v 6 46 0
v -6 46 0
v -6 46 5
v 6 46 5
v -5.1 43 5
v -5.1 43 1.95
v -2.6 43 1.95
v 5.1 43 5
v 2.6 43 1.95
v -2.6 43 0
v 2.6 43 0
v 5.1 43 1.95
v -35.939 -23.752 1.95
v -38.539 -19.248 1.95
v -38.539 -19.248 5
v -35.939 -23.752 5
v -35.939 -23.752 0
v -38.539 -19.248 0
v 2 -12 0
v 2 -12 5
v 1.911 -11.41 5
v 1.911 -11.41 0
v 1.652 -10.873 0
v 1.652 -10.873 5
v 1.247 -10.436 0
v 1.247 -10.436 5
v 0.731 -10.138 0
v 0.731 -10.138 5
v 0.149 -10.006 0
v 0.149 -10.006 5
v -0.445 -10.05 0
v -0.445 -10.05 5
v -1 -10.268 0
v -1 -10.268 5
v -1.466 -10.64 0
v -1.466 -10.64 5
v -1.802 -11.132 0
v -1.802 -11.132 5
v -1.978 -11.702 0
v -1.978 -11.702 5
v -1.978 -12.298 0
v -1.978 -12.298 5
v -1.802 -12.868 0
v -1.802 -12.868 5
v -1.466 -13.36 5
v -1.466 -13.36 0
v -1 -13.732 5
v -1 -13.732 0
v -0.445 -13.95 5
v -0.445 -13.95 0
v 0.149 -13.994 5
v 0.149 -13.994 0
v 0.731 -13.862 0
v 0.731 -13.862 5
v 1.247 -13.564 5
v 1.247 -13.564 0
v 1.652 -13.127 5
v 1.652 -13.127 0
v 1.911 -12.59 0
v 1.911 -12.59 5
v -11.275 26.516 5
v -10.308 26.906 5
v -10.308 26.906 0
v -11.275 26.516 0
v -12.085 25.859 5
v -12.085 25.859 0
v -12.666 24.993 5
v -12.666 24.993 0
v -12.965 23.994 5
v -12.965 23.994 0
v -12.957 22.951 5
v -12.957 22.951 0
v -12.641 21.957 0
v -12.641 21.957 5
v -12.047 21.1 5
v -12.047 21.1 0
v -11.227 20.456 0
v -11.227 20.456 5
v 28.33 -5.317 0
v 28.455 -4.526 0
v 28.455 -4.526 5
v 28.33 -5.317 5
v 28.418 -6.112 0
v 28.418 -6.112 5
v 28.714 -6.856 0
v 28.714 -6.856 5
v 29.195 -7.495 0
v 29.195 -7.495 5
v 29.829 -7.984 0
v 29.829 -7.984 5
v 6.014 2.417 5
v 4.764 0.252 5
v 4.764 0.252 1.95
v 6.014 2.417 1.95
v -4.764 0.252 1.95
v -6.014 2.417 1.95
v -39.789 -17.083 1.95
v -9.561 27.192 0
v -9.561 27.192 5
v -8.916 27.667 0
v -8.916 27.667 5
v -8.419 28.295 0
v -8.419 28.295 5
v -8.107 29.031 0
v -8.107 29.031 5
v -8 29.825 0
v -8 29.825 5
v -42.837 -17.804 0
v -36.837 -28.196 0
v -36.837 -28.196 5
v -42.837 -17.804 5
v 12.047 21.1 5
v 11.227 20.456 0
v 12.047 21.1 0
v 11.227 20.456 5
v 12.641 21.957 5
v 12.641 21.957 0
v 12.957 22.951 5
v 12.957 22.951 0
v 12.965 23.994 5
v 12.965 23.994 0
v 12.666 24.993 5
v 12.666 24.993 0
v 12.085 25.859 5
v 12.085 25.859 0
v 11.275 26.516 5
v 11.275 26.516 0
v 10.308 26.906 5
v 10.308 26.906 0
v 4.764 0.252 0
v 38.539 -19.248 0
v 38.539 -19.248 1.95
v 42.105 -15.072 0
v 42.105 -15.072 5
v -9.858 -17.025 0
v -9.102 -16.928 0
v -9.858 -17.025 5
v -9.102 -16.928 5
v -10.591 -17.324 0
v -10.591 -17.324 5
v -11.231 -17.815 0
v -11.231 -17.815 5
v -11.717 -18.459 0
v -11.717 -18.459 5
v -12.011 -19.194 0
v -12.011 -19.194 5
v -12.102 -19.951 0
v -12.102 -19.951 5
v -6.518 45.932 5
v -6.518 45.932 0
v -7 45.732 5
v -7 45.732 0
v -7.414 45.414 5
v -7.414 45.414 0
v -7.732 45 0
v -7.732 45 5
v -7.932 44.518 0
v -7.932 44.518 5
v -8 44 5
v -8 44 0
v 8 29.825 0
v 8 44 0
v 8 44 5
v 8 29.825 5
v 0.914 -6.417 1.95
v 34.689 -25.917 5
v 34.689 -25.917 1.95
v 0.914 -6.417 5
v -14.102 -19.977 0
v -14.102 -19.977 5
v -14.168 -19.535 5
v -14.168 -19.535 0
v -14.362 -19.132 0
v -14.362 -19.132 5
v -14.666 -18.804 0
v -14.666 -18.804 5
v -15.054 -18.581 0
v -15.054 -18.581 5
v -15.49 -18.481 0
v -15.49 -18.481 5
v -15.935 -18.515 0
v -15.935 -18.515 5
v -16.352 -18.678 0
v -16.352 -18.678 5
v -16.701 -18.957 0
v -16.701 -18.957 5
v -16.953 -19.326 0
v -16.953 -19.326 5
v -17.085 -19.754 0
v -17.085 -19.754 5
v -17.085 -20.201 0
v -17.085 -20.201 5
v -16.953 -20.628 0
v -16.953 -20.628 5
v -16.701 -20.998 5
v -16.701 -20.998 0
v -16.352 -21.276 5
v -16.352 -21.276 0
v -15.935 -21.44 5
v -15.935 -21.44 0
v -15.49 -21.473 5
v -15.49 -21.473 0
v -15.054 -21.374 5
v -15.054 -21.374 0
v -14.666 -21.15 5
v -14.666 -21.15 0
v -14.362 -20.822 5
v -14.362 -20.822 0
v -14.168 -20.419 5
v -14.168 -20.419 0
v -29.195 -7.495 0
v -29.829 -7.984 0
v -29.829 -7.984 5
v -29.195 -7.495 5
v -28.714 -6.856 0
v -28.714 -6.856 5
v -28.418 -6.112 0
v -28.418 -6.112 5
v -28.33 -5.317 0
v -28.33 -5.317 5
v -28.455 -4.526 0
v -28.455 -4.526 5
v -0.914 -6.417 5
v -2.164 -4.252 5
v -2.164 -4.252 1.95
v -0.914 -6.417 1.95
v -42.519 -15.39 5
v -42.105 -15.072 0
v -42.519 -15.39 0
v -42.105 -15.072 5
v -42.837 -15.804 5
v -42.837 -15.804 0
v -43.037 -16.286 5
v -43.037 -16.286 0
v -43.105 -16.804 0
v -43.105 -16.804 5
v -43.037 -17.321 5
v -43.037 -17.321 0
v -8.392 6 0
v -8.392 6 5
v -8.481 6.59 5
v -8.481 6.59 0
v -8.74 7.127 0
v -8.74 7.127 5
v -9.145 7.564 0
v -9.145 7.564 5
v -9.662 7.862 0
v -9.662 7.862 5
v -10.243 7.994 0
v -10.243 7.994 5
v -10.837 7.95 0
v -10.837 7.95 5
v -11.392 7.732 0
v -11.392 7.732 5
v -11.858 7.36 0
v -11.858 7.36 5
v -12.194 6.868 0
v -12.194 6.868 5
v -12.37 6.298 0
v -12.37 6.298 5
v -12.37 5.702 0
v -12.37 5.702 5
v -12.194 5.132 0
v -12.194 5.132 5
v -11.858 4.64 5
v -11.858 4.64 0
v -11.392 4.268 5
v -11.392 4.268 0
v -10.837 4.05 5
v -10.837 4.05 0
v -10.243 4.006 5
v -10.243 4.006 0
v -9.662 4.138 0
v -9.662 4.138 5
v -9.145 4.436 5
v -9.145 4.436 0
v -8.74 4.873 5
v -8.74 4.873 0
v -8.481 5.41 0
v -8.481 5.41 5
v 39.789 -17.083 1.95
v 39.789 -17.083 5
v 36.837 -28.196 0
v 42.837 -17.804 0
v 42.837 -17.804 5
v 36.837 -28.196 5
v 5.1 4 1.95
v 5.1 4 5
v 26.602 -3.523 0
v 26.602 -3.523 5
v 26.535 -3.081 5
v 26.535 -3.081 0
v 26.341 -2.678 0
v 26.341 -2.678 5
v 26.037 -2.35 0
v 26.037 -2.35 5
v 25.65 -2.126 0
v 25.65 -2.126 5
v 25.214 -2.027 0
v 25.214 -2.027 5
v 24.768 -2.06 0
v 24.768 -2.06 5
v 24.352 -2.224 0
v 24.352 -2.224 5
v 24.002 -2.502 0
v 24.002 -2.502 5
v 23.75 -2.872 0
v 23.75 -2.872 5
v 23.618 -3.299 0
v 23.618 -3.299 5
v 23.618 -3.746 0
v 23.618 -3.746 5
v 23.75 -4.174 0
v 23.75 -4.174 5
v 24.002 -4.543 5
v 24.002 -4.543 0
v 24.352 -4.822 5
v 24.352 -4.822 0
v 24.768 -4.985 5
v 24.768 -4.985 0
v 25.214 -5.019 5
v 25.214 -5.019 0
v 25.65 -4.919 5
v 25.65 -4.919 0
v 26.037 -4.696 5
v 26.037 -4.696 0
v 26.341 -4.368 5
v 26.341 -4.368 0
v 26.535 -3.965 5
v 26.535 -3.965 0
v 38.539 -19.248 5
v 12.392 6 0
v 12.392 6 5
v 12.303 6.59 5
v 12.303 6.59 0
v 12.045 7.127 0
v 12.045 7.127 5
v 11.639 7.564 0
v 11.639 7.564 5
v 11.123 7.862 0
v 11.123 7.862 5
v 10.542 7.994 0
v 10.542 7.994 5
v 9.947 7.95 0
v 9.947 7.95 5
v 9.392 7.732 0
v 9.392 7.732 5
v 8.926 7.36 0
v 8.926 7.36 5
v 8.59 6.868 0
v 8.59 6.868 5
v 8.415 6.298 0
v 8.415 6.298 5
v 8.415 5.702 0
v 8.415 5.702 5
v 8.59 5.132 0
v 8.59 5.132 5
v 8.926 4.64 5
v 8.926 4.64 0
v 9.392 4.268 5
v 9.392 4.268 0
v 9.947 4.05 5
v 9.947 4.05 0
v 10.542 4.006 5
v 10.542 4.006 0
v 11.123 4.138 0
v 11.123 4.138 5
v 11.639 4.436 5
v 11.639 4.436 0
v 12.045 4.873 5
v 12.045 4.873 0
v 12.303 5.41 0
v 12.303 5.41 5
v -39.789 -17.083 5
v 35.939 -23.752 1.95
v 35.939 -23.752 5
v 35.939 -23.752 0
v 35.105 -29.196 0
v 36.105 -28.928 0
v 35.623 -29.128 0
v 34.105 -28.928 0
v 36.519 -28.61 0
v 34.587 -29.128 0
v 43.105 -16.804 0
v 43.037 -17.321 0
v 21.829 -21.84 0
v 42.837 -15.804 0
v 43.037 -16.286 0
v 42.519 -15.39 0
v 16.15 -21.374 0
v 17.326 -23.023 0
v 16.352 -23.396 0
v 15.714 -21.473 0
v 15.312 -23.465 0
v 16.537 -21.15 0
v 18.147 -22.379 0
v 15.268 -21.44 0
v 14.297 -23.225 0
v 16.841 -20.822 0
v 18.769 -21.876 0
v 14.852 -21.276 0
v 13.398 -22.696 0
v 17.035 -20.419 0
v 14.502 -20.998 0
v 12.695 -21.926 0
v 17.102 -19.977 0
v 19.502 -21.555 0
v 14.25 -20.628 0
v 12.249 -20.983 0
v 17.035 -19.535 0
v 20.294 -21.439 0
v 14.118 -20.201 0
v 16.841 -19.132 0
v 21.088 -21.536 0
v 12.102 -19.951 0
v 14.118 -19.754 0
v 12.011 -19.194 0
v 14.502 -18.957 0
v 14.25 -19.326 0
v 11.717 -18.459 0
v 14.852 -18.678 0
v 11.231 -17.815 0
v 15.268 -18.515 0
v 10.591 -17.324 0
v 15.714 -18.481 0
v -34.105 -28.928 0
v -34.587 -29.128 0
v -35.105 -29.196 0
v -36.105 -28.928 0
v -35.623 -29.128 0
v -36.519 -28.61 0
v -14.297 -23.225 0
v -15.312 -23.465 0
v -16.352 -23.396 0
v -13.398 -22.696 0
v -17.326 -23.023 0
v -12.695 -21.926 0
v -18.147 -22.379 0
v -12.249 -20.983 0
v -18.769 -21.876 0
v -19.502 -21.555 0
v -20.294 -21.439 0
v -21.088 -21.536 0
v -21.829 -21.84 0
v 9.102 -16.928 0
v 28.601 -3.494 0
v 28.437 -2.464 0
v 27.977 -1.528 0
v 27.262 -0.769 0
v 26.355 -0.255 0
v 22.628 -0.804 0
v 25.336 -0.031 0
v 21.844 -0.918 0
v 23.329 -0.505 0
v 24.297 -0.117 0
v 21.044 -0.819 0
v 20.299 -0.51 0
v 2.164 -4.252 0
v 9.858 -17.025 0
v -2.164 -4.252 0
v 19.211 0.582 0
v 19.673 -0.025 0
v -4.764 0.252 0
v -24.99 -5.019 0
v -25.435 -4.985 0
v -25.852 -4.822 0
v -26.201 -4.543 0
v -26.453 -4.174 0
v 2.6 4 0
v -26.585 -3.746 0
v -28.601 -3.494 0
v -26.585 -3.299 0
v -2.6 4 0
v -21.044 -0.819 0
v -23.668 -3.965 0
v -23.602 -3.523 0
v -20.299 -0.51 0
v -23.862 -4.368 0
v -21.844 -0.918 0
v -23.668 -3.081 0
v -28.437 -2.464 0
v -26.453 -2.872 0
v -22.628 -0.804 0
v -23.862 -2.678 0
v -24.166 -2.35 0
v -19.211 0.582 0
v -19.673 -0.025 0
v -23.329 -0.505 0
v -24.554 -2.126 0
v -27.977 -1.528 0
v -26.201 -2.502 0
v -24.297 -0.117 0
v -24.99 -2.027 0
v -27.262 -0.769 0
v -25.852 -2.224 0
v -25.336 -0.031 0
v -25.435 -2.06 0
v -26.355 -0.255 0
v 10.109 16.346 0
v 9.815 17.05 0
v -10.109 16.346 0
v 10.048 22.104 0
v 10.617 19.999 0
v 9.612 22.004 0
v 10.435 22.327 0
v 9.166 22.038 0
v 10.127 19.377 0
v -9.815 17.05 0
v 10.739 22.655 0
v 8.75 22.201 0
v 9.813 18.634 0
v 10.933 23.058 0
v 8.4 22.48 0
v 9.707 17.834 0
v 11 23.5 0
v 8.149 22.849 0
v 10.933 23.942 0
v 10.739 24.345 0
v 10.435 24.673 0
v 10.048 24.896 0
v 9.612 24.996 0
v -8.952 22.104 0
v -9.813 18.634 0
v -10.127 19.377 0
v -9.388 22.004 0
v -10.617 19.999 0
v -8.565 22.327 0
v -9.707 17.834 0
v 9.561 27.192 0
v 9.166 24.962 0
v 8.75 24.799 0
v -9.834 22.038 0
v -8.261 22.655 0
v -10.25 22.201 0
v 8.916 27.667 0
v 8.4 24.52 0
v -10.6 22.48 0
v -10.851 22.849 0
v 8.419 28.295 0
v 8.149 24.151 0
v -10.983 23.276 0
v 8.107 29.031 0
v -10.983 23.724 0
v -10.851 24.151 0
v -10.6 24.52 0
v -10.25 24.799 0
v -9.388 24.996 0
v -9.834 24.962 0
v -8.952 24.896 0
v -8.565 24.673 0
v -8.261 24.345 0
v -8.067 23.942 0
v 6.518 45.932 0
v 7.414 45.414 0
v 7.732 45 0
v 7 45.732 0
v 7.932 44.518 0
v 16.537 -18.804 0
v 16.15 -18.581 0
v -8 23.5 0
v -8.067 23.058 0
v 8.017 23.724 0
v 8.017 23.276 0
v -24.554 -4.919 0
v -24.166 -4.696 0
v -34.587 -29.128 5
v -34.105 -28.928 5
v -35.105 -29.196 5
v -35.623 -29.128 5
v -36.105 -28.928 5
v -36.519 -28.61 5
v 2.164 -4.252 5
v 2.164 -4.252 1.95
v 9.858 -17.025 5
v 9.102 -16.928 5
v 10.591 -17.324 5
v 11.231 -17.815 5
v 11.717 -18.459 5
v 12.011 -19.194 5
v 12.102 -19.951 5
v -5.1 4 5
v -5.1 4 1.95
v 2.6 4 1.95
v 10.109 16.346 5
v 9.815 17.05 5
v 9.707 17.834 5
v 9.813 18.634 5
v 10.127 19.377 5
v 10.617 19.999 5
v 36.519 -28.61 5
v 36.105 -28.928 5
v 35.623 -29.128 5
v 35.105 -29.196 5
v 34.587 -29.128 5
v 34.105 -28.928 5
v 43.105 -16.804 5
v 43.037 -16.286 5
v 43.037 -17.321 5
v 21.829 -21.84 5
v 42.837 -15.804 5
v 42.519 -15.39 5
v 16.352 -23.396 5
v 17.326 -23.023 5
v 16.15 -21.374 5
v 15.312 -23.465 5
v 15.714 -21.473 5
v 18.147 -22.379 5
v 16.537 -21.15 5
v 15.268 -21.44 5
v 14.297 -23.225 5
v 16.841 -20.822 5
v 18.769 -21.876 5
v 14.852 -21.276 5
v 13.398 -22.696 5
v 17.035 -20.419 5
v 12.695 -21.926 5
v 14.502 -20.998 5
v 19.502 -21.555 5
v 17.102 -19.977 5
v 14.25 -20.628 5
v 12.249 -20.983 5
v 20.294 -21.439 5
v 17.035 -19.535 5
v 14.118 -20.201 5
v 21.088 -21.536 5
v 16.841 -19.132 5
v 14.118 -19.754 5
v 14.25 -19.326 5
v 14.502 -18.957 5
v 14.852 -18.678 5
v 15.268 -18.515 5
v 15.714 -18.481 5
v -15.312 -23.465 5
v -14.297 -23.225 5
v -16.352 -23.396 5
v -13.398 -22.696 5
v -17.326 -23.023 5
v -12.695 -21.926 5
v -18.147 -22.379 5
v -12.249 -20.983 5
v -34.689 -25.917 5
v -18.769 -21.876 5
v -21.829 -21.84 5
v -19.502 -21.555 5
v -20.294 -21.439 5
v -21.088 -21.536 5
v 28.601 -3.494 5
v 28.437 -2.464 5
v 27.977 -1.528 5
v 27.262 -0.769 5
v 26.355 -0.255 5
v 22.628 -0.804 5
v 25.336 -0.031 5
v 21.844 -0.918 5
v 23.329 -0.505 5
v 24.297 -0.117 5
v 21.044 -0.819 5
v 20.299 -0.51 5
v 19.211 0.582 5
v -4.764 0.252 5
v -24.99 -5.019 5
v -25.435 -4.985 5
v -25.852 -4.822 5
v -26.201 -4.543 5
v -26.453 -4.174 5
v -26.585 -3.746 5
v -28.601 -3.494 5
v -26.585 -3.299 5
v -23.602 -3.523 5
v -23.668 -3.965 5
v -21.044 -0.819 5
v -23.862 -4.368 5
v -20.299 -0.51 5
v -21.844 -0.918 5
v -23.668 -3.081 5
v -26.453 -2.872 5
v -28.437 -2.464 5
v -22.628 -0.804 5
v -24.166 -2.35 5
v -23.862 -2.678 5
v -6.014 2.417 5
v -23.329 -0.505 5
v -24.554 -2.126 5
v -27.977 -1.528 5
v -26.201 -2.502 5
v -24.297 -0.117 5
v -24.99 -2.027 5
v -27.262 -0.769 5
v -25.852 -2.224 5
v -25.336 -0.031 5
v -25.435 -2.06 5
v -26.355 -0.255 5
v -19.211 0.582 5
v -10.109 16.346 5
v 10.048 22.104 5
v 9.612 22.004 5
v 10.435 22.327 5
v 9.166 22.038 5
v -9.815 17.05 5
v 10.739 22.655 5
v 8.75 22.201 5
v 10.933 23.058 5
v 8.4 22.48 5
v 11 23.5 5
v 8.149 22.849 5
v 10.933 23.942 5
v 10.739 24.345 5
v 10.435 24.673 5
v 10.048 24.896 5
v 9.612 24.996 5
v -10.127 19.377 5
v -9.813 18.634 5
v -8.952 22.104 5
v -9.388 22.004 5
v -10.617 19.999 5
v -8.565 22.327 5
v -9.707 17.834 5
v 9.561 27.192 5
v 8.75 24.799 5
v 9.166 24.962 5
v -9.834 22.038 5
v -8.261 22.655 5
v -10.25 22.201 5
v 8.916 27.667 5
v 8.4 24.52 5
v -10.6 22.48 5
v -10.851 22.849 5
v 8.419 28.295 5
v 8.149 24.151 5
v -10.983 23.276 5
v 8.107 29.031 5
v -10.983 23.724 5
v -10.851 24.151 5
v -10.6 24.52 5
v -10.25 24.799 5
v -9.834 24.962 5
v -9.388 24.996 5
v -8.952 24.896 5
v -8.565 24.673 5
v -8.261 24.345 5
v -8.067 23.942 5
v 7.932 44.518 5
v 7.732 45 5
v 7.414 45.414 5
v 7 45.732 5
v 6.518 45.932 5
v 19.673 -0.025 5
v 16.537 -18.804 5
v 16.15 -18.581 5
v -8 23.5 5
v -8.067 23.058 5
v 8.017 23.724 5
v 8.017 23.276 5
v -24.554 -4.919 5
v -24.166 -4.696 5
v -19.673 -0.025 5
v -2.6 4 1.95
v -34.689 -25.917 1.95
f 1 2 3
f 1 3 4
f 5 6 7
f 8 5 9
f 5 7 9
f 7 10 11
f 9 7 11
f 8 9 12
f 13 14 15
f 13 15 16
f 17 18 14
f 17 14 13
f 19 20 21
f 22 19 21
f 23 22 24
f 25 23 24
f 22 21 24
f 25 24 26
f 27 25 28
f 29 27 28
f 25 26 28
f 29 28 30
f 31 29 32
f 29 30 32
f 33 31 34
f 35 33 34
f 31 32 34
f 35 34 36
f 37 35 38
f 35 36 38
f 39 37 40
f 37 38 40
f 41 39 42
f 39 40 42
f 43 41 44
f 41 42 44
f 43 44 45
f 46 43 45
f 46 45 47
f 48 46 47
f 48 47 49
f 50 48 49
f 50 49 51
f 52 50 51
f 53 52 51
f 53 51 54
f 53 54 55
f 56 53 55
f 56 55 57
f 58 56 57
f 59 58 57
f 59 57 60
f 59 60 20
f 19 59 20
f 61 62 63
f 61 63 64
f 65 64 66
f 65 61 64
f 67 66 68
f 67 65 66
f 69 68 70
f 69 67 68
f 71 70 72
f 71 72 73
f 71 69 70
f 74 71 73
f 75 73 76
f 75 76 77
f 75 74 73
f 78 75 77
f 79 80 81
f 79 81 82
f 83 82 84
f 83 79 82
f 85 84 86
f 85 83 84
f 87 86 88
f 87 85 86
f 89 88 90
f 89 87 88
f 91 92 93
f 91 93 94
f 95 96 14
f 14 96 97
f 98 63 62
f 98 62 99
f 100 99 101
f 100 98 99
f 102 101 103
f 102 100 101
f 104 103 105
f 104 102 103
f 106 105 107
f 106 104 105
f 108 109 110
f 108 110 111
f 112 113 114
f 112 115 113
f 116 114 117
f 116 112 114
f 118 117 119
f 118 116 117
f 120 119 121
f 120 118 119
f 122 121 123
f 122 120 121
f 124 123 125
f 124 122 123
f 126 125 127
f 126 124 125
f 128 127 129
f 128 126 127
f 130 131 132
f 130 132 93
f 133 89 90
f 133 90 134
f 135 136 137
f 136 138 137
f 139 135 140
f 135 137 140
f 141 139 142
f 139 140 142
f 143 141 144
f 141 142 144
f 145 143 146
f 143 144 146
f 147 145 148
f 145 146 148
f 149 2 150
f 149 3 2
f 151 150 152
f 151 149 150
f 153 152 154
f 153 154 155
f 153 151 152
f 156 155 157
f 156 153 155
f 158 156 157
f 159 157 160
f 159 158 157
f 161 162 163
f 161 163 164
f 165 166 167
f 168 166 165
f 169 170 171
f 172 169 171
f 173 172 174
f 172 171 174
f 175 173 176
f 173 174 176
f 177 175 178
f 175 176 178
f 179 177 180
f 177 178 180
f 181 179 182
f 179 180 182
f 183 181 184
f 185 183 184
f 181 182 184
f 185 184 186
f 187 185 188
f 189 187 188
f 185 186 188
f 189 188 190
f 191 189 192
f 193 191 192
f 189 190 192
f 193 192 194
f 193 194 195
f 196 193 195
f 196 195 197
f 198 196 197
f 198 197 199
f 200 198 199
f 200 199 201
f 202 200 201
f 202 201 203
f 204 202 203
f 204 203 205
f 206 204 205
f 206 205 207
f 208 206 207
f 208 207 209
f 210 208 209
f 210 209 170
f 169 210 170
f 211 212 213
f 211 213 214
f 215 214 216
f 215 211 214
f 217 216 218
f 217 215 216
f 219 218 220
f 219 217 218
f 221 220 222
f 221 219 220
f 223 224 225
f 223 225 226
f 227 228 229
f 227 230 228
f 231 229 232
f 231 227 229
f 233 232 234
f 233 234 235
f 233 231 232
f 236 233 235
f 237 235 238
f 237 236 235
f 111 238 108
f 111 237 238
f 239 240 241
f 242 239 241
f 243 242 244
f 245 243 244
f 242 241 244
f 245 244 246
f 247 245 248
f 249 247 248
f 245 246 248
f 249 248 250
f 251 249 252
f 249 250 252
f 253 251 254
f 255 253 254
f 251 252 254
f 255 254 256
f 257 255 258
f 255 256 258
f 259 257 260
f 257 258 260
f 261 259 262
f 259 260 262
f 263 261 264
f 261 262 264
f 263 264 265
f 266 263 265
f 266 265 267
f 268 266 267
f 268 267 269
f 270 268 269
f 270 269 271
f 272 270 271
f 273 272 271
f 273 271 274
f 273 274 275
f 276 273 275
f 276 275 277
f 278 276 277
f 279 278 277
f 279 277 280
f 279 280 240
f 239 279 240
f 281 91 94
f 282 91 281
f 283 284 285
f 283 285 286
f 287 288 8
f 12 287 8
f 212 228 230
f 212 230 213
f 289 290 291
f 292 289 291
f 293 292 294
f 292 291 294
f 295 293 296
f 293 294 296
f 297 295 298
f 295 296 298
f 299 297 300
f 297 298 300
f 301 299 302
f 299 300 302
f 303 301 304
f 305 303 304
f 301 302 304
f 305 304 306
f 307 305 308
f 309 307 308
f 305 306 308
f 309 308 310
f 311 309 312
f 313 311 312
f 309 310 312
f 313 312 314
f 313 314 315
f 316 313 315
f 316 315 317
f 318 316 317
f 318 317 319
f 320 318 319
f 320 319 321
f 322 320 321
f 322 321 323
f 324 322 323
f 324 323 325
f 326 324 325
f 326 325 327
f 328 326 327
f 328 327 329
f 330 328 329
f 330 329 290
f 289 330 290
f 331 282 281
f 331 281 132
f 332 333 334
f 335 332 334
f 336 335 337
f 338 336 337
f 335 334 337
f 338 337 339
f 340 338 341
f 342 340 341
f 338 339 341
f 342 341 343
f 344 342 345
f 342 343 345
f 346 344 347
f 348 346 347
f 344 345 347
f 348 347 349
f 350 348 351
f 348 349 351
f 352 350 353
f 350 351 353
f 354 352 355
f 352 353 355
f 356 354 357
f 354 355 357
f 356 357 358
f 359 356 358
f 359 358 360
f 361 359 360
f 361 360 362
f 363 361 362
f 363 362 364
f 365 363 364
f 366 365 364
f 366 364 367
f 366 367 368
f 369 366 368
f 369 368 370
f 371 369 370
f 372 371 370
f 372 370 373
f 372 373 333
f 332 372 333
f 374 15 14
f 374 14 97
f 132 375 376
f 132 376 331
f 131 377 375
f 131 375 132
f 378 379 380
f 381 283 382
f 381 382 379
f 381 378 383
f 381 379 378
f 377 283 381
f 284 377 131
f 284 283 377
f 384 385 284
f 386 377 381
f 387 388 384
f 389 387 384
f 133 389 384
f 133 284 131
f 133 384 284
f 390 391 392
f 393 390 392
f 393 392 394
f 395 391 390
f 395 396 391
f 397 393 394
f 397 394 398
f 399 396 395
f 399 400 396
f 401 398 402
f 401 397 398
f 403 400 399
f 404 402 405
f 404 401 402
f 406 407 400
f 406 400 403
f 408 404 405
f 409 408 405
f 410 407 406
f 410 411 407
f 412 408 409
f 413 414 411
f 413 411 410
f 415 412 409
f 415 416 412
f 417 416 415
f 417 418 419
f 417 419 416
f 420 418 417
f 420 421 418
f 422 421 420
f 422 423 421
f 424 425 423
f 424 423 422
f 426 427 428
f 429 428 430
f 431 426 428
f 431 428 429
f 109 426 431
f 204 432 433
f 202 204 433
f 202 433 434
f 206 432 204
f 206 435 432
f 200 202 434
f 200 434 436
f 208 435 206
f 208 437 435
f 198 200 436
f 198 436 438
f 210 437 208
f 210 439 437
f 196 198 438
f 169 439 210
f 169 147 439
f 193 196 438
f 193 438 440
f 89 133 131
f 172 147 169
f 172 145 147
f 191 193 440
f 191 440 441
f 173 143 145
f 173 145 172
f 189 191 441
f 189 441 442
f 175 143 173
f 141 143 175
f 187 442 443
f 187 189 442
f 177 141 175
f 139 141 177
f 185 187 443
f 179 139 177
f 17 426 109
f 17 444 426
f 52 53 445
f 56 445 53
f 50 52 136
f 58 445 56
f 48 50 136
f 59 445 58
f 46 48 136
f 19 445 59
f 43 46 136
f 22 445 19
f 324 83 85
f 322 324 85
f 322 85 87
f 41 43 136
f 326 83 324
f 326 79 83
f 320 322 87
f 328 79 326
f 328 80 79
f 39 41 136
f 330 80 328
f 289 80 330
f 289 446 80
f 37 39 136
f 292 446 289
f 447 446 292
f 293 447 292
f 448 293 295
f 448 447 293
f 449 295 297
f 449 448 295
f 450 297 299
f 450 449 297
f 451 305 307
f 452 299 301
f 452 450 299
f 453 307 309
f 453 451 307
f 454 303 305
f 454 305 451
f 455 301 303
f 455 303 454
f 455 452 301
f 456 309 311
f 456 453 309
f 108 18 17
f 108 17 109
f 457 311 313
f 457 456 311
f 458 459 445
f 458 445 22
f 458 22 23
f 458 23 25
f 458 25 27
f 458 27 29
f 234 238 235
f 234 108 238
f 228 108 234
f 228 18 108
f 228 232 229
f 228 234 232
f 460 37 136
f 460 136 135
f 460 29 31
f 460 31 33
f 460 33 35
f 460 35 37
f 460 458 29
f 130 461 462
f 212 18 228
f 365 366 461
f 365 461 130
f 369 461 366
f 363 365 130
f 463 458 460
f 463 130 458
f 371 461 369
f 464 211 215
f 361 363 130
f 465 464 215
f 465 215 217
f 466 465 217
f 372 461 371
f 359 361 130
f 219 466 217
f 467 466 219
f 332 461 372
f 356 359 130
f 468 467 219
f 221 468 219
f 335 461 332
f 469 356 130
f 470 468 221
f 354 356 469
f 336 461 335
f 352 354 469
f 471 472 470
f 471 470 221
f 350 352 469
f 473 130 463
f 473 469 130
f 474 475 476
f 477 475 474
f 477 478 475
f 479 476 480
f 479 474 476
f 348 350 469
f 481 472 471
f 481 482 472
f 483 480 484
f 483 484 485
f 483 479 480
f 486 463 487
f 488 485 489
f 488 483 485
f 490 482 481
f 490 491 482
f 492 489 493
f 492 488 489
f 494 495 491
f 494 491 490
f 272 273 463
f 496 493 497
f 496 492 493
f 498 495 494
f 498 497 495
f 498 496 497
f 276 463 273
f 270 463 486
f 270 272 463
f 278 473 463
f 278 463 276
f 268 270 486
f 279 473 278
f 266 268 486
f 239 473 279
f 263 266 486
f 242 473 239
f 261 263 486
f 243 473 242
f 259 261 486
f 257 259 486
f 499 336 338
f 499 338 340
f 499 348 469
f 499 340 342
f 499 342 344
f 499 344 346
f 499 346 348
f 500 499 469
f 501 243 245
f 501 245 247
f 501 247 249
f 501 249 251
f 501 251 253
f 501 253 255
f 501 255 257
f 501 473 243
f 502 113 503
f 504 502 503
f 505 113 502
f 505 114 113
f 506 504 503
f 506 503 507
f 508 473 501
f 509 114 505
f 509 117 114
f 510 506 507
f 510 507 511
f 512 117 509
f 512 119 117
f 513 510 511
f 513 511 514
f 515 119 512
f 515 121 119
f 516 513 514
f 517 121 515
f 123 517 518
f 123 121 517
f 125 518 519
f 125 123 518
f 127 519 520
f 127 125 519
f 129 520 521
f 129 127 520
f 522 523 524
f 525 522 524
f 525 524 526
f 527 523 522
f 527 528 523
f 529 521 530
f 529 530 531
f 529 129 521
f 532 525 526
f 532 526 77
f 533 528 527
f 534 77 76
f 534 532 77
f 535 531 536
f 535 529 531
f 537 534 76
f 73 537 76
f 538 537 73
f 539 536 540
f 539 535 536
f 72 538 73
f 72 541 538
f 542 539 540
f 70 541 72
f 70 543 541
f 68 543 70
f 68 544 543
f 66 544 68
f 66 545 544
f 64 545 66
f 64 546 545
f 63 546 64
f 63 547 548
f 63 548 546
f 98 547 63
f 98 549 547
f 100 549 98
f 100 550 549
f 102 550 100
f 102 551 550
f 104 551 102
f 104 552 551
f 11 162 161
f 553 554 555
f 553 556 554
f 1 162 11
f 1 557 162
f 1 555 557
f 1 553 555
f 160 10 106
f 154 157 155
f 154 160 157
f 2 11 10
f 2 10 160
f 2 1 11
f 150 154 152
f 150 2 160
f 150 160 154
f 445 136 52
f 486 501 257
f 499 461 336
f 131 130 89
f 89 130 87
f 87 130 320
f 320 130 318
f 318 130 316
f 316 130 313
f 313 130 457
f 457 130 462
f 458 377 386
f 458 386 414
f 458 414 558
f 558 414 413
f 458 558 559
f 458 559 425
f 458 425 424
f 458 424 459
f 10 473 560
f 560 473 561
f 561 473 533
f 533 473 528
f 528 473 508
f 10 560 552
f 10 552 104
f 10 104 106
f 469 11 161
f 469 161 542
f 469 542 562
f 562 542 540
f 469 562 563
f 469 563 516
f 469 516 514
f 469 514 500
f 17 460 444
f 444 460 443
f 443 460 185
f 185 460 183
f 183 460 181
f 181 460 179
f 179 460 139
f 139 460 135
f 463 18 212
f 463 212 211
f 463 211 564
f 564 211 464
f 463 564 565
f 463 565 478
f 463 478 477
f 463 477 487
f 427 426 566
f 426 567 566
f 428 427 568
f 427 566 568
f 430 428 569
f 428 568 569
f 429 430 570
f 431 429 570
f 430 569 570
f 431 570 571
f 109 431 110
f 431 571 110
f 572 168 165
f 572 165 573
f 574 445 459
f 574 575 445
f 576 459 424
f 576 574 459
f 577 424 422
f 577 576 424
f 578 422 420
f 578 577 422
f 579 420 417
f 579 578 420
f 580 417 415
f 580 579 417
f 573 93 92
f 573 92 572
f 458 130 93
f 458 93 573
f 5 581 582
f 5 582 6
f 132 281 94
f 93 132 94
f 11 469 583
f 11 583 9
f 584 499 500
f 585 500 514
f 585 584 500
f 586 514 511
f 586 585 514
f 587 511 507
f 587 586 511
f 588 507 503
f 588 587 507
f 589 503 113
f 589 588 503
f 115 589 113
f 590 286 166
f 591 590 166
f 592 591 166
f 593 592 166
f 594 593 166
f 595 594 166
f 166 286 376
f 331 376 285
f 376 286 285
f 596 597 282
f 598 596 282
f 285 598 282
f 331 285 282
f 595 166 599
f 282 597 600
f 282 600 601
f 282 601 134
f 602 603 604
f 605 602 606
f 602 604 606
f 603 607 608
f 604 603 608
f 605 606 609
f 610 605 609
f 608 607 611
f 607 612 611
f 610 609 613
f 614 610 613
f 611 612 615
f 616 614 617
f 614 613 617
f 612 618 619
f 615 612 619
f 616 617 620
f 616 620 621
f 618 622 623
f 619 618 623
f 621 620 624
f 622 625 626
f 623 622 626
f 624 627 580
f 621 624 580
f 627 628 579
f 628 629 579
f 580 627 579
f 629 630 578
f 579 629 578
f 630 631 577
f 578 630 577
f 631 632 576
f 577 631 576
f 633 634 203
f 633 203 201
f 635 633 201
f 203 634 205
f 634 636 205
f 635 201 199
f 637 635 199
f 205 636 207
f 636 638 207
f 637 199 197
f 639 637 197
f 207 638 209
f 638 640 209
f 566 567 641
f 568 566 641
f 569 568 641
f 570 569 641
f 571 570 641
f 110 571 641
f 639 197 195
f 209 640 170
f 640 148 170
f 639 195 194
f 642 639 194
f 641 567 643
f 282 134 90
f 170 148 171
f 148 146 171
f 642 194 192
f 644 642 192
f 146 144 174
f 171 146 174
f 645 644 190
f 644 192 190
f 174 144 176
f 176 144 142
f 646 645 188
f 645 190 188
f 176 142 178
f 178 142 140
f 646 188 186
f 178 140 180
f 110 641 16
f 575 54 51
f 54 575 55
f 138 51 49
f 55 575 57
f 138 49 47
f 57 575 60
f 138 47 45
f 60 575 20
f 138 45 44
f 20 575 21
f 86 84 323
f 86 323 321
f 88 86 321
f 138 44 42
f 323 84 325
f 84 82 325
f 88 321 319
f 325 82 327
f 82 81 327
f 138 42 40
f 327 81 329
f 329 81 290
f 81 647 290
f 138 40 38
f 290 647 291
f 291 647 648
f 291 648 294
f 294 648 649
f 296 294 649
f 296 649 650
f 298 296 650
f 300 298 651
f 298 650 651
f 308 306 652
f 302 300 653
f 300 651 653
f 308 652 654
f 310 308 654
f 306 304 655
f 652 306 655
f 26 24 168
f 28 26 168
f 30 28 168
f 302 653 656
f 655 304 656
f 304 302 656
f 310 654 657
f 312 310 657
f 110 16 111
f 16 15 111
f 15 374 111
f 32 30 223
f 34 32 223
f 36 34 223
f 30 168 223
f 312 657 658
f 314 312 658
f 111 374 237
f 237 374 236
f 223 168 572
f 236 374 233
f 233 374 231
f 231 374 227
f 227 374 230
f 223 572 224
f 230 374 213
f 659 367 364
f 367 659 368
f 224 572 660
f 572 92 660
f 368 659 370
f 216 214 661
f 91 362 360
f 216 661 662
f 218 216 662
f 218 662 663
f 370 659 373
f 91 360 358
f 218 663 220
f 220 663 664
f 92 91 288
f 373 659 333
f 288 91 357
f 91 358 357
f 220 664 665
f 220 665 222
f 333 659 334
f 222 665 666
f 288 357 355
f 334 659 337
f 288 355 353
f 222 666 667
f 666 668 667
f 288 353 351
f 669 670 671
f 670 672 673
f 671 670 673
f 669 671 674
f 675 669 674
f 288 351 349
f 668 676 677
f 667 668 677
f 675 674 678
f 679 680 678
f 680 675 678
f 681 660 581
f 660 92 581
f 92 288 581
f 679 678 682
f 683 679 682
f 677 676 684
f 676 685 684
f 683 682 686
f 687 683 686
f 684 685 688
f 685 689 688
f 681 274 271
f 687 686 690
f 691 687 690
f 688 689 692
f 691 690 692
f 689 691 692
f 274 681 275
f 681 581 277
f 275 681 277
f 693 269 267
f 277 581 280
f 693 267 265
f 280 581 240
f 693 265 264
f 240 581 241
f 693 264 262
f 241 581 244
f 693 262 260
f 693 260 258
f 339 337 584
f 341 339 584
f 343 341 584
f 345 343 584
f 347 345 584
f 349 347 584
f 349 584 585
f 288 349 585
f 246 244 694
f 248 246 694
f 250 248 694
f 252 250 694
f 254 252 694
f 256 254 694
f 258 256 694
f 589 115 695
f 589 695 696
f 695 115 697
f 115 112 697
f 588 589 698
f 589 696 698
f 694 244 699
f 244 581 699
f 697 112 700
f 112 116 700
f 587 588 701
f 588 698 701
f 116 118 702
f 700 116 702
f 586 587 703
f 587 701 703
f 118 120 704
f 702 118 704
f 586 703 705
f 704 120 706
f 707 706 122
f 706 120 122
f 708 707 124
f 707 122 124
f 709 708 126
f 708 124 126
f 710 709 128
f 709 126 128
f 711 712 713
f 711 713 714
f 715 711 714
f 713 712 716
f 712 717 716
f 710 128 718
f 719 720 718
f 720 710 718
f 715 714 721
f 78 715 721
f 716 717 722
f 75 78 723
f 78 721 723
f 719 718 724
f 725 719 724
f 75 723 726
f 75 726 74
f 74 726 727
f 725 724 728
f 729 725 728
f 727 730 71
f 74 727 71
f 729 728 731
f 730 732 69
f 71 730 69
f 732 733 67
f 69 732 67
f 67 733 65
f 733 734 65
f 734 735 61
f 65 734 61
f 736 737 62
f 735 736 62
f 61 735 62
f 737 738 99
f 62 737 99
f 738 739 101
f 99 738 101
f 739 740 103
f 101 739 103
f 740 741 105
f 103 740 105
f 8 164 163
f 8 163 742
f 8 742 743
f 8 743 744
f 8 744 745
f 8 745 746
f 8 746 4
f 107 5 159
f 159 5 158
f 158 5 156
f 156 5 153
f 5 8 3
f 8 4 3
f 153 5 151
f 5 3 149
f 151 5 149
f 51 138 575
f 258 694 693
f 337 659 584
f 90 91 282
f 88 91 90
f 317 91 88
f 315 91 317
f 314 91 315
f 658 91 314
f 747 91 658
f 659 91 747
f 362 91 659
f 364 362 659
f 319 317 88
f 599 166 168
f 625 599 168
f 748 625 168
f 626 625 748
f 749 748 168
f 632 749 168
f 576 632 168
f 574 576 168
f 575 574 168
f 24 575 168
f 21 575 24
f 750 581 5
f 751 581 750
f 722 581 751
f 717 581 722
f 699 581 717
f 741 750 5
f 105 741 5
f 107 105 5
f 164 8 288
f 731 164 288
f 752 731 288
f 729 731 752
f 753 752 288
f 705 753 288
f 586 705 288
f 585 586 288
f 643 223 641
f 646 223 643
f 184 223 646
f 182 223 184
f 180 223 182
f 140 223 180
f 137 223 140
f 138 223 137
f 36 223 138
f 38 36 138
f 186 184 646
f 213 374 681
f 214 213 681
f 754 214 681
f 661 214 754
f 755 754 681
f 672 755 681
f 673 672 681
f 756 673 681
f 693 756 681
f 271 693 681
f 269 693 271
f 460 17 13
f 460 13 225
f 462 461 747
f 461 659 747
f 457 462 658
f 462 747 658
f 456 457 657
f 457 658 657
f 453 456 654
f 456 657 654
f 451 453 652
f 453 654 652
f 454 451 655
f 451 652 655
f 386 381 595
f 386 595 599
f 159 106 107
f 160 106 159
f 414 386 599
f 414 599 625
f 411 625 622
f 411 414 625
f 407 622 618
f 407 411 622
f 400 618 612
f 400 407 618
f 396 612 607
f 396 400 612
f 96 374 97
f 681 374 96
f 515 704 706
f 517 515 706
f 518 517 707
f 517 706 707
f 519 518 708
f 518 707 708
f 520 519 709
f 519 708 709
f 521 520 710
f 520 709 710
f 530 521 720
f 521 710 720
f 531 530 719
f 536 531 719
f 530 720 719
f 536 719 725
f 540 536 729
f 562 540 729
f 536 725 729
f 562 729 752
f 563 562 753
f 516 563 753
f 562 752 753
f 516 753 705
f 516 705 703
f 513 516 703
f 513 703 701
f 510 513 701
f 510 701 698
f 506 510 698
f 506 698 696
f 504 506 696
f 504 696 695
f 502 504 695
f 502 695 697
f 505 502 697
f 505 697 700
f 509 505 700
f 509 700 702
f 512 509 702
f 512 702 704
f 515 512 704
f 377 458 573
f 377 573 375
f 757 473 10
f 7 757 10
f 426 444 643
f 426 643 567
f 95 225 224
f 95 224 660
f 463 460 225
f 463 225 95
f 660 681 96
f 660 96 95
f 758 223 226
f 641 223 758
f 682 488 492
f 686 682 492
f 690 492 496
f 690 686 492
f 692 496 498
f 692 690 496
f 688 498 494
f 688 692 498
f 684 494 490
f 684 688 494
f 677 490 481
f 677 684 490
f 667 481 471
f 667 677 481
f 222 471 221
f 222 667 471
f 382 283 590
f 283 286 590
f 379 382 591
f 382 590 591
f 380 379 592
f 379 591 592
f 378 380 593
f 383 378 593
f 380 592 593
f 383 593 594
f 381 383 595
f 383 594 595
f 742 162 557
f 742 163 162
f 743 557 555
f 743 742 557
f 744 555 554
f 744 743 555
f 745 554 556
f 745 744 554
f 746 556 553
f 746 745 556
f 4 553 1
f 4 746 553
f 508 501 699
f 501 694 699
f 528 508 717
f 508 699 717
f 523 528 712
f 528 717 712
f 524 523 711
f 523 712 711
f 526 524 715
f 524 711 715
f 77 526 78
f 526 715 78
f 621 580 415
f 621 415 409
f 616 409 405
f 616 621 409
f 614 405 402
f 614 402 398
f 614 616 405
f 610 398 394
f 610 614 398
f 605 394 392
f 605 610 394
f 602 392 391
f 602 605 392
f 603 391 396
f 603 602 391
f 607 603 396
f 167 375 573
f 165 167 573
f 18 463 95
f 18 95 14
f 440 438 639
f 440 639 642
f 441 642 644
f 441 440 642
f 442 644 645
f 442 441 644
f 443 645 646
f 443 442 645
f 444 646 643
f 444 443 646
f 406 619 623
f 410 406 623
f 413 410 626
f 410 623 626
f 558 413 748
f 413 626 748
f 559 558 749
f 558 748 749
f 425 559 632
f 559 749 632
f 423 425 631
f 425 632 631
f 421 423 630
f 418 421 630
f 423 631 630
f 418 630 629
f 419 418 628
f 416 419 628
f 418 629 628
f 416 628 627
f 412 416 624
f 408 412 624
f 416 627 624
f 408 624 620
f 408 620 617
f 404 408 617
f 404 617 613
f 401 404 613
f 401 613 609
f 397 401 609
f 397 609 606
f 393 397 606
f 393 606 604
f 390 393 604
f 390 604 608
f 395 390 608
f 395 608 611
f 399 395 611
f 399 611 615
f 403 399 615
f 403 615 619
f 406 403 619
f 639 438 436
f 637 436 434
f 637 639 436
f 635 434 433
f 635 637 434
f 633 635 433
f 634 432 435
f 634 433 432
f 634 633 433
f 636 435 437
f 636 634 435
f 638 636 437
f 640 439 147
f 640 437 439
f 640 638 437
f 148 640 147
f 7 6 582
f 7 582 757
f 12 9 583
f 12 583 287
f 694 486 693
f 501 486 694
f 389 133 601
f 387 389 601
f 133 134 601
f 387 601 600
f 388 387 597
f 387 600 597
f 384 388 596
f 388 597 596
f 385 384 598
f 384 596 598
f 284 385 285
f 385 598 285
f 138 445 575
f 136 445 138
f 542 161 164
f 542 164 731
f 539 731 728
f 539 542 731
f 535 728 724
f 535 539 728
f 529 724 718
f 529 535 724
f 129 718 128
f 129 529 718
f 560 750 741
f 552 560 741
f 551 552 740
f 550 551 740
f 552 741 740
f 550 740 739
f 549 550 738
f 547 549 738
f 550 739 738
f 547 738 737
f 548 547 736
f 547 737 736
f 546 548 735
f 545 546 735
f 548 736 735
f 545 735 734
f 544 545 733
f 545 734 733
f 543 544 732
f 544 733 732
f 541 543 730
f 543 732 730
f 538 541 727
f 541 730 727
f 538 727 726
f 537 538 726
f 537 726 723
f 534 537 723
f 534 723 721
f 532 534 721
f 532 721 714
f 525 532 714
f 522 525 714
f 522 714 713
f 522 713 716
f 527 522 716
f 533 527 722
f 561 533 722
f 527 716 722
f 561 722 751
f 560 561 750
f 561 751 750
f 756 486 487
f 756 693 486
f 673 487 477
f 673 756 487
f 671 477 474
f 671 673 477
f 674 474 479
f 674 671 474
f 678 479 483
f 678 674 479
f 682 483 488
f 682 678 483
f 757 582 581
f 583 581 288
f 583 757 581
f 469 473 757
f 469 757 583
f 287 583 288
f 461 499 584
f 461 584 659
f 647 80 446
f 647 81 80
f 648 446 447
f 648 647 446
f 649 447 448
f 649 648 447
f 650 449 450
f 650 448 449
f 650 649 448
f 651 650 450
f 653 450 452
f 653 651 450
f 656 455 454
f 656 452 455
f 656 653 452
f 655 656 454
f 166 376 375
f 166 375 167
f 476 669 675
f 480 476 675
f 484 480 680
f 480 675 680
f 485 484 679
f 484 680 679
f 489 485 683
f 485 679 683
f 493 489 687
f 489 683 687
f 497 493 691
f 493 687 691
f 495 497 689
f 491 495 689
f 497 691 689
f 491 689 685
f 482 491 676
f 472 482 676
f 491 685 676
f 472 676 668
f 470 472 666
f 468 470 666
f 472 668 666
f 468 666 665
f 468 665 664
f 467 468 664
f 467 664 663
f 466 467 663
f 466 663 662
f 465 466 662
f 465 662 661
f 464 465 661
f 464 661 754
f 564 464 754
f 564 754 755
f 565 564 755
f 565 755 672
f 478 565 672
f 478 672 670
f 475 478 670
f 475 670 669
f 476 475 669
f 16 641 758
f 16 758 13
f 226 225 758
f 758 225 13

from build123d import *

# Parameters (mm, degrees)
SKETCH1_W           = 5.2
SKETCH1_H           = 39
BOSS_EXTRUDE1_DEPTH = 5
SKETCH2_W           = 10.2
SKETCH2_H           = 39
CUT_EXTRUDE1_DEPTH  = 3.05
CUT_EXTRUDE2_REACH  = 65.739
SKETCH3_R           = 2
SKETCH4_R           = 3.5
SKETCH4_R_2         = 1.5
BOSS_EXTRUDE2_DEPTH = 5
FILLET1_R           = 3
FILLET2_R           = 3
FILLET3_R           = 2


with BuildPart() as part:
    # Sketch1 → Boss-Extrude1 (new body)
    with BuildSketch(Plane.XY):
        Polygon((-8, 46), (8, 46), (8, 20), (21.320508076, -3.07179677), (43.837168574, -16.07179677), (35.837168574, -29.92820323), (13.320508076, -16.92820323), (-13.320508076, -16.92820323), (-35.837168574, -29.92820323), (-43.837168574, -16.07179677), (-21.320508076, -3.07179677), (-8, 20), align=None)
        Polygon((4.764101615, 0.25166605), (2.164101615, -4.25166605), (35.939092363, -23.75166605), (38.539092363, -19.24833395), align=None, mode=Mode.SUBTRACT)
        with Locations((0, 23.5)):
            Rectangle(SKETCH1_W, SKETCH1_H, mode=Mode.SUBTRACT)
        Polygon((-2.164101615, -4.25166605), (-4.764101615, 0.25166605), (-38.539092363, -19.24833395), (-35.939092363, -23.75166605), align=None, mode=Mode.SUBTRACT)
    extrude(amount=BOSS_EXTRUDE1_DEPTH)

    # Sketch2 → Cut-Extrude1 (cut)
    with BuildSketch(Plane.XY.offset(5)):
        with Locations((0, 23.5)):
            Rectangle(SKETCH2_W, SKETCH2_H)
        Polygon((39.789092363, -17.083270441), (34.689092363, -25.916729559), (0.914101615, -6.416729559), (6.014101615, 2.416729559), align=None)
        Polygon((-34.689092363, -25.916729559), (-39.789092363, -17.083270441), (-6.014101615, 2.416729559), (-0.914101615, -6.416729559), align=None)
    extrude(amount=-CUT_EXTRUDE1_DEPTH, mode=Mode.SUBTRACT)

    # Sketch3 → Cut-Extrude2 (cut, up to next)
    with BuildSketch(Plane.XY.offset(5), mode=Mode.PRIVATE) as cut_extrude2_sk1:
        with Locations((0, -12)):
            Circle(SKETCH3_R)
    cut_extrude2_tool1 = extrude(cut_extrude2_sk1.sketch, amount=-CUT_EXTRUDE2_REACH, mode=Mode.PRIVATE) & part.part
    # Sketch3 → Cut-Extrude2 (cut, up to next)
    with BuildSketch(Plane.XY.offset(5), mode=Mode.PRIVATE) as cut_extrude2_sk2:
        with Locations((-10.392304845, 6)):
            Circle(SKETCH3_R)
    cut_extrude2_tool2 = extrude(cut_extrude2_sk2.sketch, amount=-CUT_EXTRUDE2_REACH, mode=Mode.PRIVATE) & part.part
    # Sketch3 → Cut-Extrude2 (cut, up to next)
    with BuildSketch(Plane.XY.offset(5), mode=Mode.PRIVATE) as cut_extrude2_sk3:
        with Locations((10.392304845, 6)):
            Circle(SKETCH3_R)
    cut_extrude2_tool3 = extrude(cut_extrude2_sk3.sketch, amount=-CUT_EXTRUDE2_REACH, mode=Mode.PRIVATE) & part.part
    add(cut_extrude2_tool1.solids().sort_by_distance((0, -12, 5))[0], mode=Mode.SUBTRACT)
    add(cut_extrude2_tool2.solids().sort_by_distance((-10.392305, 6, 5))[0], mode=Mode.SUBTRACT)
    add(cut_extrude2_tool3.solids().sort_by_distance((10.392305, 6, 5))[0], mode=Mode.SUBTRACT)

    # Sketch4 → Boss-Extrude2 (add)
    # profile 1 of 6: a face of its own
    with BuildSketch(Plane.XY.offset(5)):
        with Locations((9.5, 23.5)):
            Circle(SKETCH4_R)
        with Locations((9.5, 23.5)):
            Circle(SKETCH4_R_2, mode=Mode.SUBTRACT)
    # profile 2 of 6: a face of its own
    with BuildSketch(Plane.XY.offset(5)):
        with Locations((-9.5, 23.5)):
            Circle(SKETCH4_R)
        with Locations((-9.5, 23.5)):
            Circle(SKETCH4_R_2, mode=Mode.SUBTRACT)
    # profile 3 of 6: a face of its own
    with BuildSketch(Plane.XY.offset(5)):
        with Locations((25.101596989, -3.522758664)):
            Circle(SKETCH4_R)
        with Locations((25.101596989, -3.522758664)):
            Circle(SKETCH4_R_2, mode=Mode.SUBTRACT)
    # profile 4 of 6: a face of its own
    with BuildSketch(Plane.XY.offset(5)):
        with Locations((15.601596989, -19.977241336)):
            Circle(SKETCH4_R)
        with Locations((15.601596989, -19.977241336)):
            Circle(SKETCH4_R_2, mode=Mode.SUBTRACT)
    # profile 5 of 6: a face of its own
    with BuildSketch(Plane.XY.offset(5)):
        with Locations((-15.601596989, -19.977241336)):
            Circle(SKETCH4_R)
        with Locations((-15.601596989, -19.977241336)):
            Circle(SKETCH4_R_2, mode=Mode.SUBTRACT)
    # profile 6 of 6: a face of its own
    with BuildSketch(Plane.XY.offset(5)):
        with Locations((-25.101596989, -3.522758664)):
            Circle(SKETCH4_R)
        with Locations((-25.101596989, -3.522758664)):
            Circle(SKETCH4_R_2, mode=Mode.SUBTRACT)
    extrude(amount=-BOSS_EXTRUDE2_DEPTH)

    # Fillet1
    # the kernel refuses this fillet: 3 mm, written as the material it adds along each edge
    with BuildSketch(Plane(origin=(8, 26.66227766, 0), x_dir=(0.9944903161976937, 0.10482848367219241, 0), z_dir=(0, 0, 1)), Plane(origin=(19.090209776, -20.25934206, 0), x_dir=(-0.40646102819849994, -0.9136681194809295, 0), z_dir=(0, 0, 1)), Plane(origin=(-27.090209776, -6.4029356, 0), x_dir=(-0.5880292879992107, 0.8088396358086942, 0), z_dir=(0, 0, 1))) as fillet1_piece_1:
        with BuildLine():
            CenterArc((3.314967721, 2.830369059), FILLET1_R, 173.982715136, 76.657636203)
            Line((0.331496772, 3.14485451), (0.271827353, 3.151144219))
            Line((0.271827353, 3.151144219), (-0.059669419, 0.006289709))
            Line((-0.059669419, 0.006289709), (0.019889806, -0.056607381))
            ThreePointArc((0.019889806, -0.056607381), (1.160238702, 0.137902764), (2.300587598, -0.056607381))
            Line((2.300587598, -0.056607381), (2.320477404, 0))
        make_face()
    extrude(amount=5)
    with BuildSketch(Plane(origin=(8, 20.33772234, 0), x_dir=(0, -1, 0), z_dir=(0, 0, 1)), Plane(origin=(13.612984201, -17.0970644, 0), x_dir=(-0.8660254037844379, 0.5000000000000013, 0), z_dir=(0, 0, 1)), Plane(origin=(-21.612984201, -3.24065794, 0), x_dir=(0.8660254037844385, 0.5000000000000004, 0), z_dir=(0, 0, 1))) as fillet1_piece_2:
        with BuildLine():
            CenterArc((3.27592086, 0.605796547), FILLET1_R, 172.092756849, 19.557213735)
            Line((0.30444462, 1.018505833), (0.245015095, 1.026760019))
            ThreePointArc((0.245015095, 1.026760019), (0.133629185, 0.514810643), (-0.054210474, 0.025714286))
            Line((-0.054210474, 0.025714286), (0, -0.06))
            ThreePointArc((0, -0.06), (0.16886117, -0.06), (0.278958369, -0.012115931))
            Line((0.278958369, -0.012115931), (0.33772234, 0))
        make_face()
    extrude(amount=5)
    with BuildSketch(Plane(origin=(-8, 20.33772234, 0), x_dir=(-0.9581124549425506, -0.2863922549301202, 0), z_dir=(0, 0, 1)), Plane(origin=(21.612984201, -3.24065794, 0), x_dir=(0.231033259254711, 0.9729458531275754, 0), z_dir=(0, 0, 1)), Plane(origin=(-13.612984201, -17.0970644, 0), x_dir=(0.7270791956878222, -0.6865535981975109, 0), z_dir=(0, 0, 1))) as fillet1_piece_3:
        with BuildLine():
            CenterArc((1.518619579, 2.965205138), FILLET1_R, 241.707941077, 19.557213735)
            Line((0.096721062, 0.32357598), (0.068283092, 0.270743397))
            ThreePointArc((0.068283092, 0.270743397), (-0.009126216, 0.178971525), (-0.057486747, 0.017183535))
            Line((-0.057486747, 0.017183535), (0.009111717, -0.059304103))
            ThreePointArc((0.009111717, -0.059304103), (0.531516853, -0.019405995), (1.053921988, -0.059304103))
            Line((1.053921988, -0.059304103), (1.063033705, 0))
        make_face()
    extrude(amount=5)
    with BuildSketch(Plane(origin=(-8, 26.66227766, 0), x_dir=(-0.9944903161976939, 0.10482848367219239, 0), z_dir=(0, 0, 1))) as fillet1_piece_4:
        with BuildLine():
            CenterArc((3.314967721, -2.830369059), FILLET1_R, 109.359648661, 76.657636203)
            Line((0.331496772, -3.14485451), (0.271827353, -3.151144219))
            Line((0.271827353, -3.151144219), (-0.059669419, -0.006289709))
            Line((-0.059669419, -0.006289709), (0.019889806, 0.056607381))
            ThreePointArc((0.019889806, 0.056607381), (1.160238702, -0.137902764), (2.300587598, 0.056607381))
            Line((2.300587598, 0.056607381), (2.320477404, 0))
        make_face()
    extrude(amount=5)
    with BuildSketch(Plane(origin=(27.090209776, -6.4029356, 0), x_dir=(0.8660254037844388, -0.4999999999999998, 0), z_dir=(0, 0, 1)), Plane(origin=(-19.090209776, -20.25934206, 0), x_dir=(-0.8660254037844379, -0.5000000000000012, 0), z_dir=(0, 0, 1))) as fillet1_piece_5:
        with BuildLine():
            CenterArc((3.16227766, 3), FILLET1_R, 193.342363797, 76.657636203)
            Line((0.243252128, 2.307692308), (0.184871617, 2.293846154))
            ThreePointArc((0.184871617, 2.293846154), (0.258769028, 1.139390016), (-0.054210474, 0.025714286))
            Line((-0.054210474, 0.025714286), (0, -0.06))
            Line((0, -0.06), (3.16227766, -0.06))
            Line((3.16227766, -0.06), (3.16227766, 0))
        make_face()
    extrude(amount=5)

    # Fillet2
    fillet2_edges = [part.edges().sort_by_distance(p)[0] for p in [
        (8, 20, 2.5),
    ]]
    fillet(fillet2_edges, radius=FILLET2_R)
    fillet2_2_edges = [part.edges().sort_by_distance(p)[0] for p in [
        (-13.320508076, -16.92820323, 2.5),
    ]]
    fillet(fillet2_2_edges, radius=FILLET2_R)
    fillet2_3_edges = [part.edges().sort_by_distance(p)[0] for p in [
        (13.320508076, -16.92820323, 2.5),
    ]]
    fillet(fillet2_3_edges, radius=FILLET2_R)
    fillet2_4_edges = [part.edges().sort_by_distance(p)[0] for p in [
        (-8, 20, 2.5),
    ]]
    fillet(fillet2_4_edges, radius=FILLET2_R)
    fillet2_5_edges = [part.edges().sort_by_distance(p)[0] for p in [
        (-21.320508076, -3.07179677, 2.5),
    ]]
    fillet(fillet2_5_edges, radius=FILLET2_R)
    fillet2_6_edges = [part.edges().sort_by_distance(p)[0] for p in [
        (21.320508076, -3.07179677, 2.5),
    ]]
    fillet(fillet2_6_edges, radius=FILLET2_R)

    # Fillet3
    fillet3_edges = [part.edges().sort_by_distance(p)[0] for p in [
        (43.837168574, -16.07179677, 2.5),
        (35.837168574, -29.92820323, 2.5),
        (-35.837168574, -29.92820323, 2.5),
        (-43.837168574, -16.07179677, 2.5),
        (-8, 46, 2.5),
        (8, 46, 2.5),
    ]]
    fillet(fillet3_edges, radius=FILLET3_R)


solid = part.part
